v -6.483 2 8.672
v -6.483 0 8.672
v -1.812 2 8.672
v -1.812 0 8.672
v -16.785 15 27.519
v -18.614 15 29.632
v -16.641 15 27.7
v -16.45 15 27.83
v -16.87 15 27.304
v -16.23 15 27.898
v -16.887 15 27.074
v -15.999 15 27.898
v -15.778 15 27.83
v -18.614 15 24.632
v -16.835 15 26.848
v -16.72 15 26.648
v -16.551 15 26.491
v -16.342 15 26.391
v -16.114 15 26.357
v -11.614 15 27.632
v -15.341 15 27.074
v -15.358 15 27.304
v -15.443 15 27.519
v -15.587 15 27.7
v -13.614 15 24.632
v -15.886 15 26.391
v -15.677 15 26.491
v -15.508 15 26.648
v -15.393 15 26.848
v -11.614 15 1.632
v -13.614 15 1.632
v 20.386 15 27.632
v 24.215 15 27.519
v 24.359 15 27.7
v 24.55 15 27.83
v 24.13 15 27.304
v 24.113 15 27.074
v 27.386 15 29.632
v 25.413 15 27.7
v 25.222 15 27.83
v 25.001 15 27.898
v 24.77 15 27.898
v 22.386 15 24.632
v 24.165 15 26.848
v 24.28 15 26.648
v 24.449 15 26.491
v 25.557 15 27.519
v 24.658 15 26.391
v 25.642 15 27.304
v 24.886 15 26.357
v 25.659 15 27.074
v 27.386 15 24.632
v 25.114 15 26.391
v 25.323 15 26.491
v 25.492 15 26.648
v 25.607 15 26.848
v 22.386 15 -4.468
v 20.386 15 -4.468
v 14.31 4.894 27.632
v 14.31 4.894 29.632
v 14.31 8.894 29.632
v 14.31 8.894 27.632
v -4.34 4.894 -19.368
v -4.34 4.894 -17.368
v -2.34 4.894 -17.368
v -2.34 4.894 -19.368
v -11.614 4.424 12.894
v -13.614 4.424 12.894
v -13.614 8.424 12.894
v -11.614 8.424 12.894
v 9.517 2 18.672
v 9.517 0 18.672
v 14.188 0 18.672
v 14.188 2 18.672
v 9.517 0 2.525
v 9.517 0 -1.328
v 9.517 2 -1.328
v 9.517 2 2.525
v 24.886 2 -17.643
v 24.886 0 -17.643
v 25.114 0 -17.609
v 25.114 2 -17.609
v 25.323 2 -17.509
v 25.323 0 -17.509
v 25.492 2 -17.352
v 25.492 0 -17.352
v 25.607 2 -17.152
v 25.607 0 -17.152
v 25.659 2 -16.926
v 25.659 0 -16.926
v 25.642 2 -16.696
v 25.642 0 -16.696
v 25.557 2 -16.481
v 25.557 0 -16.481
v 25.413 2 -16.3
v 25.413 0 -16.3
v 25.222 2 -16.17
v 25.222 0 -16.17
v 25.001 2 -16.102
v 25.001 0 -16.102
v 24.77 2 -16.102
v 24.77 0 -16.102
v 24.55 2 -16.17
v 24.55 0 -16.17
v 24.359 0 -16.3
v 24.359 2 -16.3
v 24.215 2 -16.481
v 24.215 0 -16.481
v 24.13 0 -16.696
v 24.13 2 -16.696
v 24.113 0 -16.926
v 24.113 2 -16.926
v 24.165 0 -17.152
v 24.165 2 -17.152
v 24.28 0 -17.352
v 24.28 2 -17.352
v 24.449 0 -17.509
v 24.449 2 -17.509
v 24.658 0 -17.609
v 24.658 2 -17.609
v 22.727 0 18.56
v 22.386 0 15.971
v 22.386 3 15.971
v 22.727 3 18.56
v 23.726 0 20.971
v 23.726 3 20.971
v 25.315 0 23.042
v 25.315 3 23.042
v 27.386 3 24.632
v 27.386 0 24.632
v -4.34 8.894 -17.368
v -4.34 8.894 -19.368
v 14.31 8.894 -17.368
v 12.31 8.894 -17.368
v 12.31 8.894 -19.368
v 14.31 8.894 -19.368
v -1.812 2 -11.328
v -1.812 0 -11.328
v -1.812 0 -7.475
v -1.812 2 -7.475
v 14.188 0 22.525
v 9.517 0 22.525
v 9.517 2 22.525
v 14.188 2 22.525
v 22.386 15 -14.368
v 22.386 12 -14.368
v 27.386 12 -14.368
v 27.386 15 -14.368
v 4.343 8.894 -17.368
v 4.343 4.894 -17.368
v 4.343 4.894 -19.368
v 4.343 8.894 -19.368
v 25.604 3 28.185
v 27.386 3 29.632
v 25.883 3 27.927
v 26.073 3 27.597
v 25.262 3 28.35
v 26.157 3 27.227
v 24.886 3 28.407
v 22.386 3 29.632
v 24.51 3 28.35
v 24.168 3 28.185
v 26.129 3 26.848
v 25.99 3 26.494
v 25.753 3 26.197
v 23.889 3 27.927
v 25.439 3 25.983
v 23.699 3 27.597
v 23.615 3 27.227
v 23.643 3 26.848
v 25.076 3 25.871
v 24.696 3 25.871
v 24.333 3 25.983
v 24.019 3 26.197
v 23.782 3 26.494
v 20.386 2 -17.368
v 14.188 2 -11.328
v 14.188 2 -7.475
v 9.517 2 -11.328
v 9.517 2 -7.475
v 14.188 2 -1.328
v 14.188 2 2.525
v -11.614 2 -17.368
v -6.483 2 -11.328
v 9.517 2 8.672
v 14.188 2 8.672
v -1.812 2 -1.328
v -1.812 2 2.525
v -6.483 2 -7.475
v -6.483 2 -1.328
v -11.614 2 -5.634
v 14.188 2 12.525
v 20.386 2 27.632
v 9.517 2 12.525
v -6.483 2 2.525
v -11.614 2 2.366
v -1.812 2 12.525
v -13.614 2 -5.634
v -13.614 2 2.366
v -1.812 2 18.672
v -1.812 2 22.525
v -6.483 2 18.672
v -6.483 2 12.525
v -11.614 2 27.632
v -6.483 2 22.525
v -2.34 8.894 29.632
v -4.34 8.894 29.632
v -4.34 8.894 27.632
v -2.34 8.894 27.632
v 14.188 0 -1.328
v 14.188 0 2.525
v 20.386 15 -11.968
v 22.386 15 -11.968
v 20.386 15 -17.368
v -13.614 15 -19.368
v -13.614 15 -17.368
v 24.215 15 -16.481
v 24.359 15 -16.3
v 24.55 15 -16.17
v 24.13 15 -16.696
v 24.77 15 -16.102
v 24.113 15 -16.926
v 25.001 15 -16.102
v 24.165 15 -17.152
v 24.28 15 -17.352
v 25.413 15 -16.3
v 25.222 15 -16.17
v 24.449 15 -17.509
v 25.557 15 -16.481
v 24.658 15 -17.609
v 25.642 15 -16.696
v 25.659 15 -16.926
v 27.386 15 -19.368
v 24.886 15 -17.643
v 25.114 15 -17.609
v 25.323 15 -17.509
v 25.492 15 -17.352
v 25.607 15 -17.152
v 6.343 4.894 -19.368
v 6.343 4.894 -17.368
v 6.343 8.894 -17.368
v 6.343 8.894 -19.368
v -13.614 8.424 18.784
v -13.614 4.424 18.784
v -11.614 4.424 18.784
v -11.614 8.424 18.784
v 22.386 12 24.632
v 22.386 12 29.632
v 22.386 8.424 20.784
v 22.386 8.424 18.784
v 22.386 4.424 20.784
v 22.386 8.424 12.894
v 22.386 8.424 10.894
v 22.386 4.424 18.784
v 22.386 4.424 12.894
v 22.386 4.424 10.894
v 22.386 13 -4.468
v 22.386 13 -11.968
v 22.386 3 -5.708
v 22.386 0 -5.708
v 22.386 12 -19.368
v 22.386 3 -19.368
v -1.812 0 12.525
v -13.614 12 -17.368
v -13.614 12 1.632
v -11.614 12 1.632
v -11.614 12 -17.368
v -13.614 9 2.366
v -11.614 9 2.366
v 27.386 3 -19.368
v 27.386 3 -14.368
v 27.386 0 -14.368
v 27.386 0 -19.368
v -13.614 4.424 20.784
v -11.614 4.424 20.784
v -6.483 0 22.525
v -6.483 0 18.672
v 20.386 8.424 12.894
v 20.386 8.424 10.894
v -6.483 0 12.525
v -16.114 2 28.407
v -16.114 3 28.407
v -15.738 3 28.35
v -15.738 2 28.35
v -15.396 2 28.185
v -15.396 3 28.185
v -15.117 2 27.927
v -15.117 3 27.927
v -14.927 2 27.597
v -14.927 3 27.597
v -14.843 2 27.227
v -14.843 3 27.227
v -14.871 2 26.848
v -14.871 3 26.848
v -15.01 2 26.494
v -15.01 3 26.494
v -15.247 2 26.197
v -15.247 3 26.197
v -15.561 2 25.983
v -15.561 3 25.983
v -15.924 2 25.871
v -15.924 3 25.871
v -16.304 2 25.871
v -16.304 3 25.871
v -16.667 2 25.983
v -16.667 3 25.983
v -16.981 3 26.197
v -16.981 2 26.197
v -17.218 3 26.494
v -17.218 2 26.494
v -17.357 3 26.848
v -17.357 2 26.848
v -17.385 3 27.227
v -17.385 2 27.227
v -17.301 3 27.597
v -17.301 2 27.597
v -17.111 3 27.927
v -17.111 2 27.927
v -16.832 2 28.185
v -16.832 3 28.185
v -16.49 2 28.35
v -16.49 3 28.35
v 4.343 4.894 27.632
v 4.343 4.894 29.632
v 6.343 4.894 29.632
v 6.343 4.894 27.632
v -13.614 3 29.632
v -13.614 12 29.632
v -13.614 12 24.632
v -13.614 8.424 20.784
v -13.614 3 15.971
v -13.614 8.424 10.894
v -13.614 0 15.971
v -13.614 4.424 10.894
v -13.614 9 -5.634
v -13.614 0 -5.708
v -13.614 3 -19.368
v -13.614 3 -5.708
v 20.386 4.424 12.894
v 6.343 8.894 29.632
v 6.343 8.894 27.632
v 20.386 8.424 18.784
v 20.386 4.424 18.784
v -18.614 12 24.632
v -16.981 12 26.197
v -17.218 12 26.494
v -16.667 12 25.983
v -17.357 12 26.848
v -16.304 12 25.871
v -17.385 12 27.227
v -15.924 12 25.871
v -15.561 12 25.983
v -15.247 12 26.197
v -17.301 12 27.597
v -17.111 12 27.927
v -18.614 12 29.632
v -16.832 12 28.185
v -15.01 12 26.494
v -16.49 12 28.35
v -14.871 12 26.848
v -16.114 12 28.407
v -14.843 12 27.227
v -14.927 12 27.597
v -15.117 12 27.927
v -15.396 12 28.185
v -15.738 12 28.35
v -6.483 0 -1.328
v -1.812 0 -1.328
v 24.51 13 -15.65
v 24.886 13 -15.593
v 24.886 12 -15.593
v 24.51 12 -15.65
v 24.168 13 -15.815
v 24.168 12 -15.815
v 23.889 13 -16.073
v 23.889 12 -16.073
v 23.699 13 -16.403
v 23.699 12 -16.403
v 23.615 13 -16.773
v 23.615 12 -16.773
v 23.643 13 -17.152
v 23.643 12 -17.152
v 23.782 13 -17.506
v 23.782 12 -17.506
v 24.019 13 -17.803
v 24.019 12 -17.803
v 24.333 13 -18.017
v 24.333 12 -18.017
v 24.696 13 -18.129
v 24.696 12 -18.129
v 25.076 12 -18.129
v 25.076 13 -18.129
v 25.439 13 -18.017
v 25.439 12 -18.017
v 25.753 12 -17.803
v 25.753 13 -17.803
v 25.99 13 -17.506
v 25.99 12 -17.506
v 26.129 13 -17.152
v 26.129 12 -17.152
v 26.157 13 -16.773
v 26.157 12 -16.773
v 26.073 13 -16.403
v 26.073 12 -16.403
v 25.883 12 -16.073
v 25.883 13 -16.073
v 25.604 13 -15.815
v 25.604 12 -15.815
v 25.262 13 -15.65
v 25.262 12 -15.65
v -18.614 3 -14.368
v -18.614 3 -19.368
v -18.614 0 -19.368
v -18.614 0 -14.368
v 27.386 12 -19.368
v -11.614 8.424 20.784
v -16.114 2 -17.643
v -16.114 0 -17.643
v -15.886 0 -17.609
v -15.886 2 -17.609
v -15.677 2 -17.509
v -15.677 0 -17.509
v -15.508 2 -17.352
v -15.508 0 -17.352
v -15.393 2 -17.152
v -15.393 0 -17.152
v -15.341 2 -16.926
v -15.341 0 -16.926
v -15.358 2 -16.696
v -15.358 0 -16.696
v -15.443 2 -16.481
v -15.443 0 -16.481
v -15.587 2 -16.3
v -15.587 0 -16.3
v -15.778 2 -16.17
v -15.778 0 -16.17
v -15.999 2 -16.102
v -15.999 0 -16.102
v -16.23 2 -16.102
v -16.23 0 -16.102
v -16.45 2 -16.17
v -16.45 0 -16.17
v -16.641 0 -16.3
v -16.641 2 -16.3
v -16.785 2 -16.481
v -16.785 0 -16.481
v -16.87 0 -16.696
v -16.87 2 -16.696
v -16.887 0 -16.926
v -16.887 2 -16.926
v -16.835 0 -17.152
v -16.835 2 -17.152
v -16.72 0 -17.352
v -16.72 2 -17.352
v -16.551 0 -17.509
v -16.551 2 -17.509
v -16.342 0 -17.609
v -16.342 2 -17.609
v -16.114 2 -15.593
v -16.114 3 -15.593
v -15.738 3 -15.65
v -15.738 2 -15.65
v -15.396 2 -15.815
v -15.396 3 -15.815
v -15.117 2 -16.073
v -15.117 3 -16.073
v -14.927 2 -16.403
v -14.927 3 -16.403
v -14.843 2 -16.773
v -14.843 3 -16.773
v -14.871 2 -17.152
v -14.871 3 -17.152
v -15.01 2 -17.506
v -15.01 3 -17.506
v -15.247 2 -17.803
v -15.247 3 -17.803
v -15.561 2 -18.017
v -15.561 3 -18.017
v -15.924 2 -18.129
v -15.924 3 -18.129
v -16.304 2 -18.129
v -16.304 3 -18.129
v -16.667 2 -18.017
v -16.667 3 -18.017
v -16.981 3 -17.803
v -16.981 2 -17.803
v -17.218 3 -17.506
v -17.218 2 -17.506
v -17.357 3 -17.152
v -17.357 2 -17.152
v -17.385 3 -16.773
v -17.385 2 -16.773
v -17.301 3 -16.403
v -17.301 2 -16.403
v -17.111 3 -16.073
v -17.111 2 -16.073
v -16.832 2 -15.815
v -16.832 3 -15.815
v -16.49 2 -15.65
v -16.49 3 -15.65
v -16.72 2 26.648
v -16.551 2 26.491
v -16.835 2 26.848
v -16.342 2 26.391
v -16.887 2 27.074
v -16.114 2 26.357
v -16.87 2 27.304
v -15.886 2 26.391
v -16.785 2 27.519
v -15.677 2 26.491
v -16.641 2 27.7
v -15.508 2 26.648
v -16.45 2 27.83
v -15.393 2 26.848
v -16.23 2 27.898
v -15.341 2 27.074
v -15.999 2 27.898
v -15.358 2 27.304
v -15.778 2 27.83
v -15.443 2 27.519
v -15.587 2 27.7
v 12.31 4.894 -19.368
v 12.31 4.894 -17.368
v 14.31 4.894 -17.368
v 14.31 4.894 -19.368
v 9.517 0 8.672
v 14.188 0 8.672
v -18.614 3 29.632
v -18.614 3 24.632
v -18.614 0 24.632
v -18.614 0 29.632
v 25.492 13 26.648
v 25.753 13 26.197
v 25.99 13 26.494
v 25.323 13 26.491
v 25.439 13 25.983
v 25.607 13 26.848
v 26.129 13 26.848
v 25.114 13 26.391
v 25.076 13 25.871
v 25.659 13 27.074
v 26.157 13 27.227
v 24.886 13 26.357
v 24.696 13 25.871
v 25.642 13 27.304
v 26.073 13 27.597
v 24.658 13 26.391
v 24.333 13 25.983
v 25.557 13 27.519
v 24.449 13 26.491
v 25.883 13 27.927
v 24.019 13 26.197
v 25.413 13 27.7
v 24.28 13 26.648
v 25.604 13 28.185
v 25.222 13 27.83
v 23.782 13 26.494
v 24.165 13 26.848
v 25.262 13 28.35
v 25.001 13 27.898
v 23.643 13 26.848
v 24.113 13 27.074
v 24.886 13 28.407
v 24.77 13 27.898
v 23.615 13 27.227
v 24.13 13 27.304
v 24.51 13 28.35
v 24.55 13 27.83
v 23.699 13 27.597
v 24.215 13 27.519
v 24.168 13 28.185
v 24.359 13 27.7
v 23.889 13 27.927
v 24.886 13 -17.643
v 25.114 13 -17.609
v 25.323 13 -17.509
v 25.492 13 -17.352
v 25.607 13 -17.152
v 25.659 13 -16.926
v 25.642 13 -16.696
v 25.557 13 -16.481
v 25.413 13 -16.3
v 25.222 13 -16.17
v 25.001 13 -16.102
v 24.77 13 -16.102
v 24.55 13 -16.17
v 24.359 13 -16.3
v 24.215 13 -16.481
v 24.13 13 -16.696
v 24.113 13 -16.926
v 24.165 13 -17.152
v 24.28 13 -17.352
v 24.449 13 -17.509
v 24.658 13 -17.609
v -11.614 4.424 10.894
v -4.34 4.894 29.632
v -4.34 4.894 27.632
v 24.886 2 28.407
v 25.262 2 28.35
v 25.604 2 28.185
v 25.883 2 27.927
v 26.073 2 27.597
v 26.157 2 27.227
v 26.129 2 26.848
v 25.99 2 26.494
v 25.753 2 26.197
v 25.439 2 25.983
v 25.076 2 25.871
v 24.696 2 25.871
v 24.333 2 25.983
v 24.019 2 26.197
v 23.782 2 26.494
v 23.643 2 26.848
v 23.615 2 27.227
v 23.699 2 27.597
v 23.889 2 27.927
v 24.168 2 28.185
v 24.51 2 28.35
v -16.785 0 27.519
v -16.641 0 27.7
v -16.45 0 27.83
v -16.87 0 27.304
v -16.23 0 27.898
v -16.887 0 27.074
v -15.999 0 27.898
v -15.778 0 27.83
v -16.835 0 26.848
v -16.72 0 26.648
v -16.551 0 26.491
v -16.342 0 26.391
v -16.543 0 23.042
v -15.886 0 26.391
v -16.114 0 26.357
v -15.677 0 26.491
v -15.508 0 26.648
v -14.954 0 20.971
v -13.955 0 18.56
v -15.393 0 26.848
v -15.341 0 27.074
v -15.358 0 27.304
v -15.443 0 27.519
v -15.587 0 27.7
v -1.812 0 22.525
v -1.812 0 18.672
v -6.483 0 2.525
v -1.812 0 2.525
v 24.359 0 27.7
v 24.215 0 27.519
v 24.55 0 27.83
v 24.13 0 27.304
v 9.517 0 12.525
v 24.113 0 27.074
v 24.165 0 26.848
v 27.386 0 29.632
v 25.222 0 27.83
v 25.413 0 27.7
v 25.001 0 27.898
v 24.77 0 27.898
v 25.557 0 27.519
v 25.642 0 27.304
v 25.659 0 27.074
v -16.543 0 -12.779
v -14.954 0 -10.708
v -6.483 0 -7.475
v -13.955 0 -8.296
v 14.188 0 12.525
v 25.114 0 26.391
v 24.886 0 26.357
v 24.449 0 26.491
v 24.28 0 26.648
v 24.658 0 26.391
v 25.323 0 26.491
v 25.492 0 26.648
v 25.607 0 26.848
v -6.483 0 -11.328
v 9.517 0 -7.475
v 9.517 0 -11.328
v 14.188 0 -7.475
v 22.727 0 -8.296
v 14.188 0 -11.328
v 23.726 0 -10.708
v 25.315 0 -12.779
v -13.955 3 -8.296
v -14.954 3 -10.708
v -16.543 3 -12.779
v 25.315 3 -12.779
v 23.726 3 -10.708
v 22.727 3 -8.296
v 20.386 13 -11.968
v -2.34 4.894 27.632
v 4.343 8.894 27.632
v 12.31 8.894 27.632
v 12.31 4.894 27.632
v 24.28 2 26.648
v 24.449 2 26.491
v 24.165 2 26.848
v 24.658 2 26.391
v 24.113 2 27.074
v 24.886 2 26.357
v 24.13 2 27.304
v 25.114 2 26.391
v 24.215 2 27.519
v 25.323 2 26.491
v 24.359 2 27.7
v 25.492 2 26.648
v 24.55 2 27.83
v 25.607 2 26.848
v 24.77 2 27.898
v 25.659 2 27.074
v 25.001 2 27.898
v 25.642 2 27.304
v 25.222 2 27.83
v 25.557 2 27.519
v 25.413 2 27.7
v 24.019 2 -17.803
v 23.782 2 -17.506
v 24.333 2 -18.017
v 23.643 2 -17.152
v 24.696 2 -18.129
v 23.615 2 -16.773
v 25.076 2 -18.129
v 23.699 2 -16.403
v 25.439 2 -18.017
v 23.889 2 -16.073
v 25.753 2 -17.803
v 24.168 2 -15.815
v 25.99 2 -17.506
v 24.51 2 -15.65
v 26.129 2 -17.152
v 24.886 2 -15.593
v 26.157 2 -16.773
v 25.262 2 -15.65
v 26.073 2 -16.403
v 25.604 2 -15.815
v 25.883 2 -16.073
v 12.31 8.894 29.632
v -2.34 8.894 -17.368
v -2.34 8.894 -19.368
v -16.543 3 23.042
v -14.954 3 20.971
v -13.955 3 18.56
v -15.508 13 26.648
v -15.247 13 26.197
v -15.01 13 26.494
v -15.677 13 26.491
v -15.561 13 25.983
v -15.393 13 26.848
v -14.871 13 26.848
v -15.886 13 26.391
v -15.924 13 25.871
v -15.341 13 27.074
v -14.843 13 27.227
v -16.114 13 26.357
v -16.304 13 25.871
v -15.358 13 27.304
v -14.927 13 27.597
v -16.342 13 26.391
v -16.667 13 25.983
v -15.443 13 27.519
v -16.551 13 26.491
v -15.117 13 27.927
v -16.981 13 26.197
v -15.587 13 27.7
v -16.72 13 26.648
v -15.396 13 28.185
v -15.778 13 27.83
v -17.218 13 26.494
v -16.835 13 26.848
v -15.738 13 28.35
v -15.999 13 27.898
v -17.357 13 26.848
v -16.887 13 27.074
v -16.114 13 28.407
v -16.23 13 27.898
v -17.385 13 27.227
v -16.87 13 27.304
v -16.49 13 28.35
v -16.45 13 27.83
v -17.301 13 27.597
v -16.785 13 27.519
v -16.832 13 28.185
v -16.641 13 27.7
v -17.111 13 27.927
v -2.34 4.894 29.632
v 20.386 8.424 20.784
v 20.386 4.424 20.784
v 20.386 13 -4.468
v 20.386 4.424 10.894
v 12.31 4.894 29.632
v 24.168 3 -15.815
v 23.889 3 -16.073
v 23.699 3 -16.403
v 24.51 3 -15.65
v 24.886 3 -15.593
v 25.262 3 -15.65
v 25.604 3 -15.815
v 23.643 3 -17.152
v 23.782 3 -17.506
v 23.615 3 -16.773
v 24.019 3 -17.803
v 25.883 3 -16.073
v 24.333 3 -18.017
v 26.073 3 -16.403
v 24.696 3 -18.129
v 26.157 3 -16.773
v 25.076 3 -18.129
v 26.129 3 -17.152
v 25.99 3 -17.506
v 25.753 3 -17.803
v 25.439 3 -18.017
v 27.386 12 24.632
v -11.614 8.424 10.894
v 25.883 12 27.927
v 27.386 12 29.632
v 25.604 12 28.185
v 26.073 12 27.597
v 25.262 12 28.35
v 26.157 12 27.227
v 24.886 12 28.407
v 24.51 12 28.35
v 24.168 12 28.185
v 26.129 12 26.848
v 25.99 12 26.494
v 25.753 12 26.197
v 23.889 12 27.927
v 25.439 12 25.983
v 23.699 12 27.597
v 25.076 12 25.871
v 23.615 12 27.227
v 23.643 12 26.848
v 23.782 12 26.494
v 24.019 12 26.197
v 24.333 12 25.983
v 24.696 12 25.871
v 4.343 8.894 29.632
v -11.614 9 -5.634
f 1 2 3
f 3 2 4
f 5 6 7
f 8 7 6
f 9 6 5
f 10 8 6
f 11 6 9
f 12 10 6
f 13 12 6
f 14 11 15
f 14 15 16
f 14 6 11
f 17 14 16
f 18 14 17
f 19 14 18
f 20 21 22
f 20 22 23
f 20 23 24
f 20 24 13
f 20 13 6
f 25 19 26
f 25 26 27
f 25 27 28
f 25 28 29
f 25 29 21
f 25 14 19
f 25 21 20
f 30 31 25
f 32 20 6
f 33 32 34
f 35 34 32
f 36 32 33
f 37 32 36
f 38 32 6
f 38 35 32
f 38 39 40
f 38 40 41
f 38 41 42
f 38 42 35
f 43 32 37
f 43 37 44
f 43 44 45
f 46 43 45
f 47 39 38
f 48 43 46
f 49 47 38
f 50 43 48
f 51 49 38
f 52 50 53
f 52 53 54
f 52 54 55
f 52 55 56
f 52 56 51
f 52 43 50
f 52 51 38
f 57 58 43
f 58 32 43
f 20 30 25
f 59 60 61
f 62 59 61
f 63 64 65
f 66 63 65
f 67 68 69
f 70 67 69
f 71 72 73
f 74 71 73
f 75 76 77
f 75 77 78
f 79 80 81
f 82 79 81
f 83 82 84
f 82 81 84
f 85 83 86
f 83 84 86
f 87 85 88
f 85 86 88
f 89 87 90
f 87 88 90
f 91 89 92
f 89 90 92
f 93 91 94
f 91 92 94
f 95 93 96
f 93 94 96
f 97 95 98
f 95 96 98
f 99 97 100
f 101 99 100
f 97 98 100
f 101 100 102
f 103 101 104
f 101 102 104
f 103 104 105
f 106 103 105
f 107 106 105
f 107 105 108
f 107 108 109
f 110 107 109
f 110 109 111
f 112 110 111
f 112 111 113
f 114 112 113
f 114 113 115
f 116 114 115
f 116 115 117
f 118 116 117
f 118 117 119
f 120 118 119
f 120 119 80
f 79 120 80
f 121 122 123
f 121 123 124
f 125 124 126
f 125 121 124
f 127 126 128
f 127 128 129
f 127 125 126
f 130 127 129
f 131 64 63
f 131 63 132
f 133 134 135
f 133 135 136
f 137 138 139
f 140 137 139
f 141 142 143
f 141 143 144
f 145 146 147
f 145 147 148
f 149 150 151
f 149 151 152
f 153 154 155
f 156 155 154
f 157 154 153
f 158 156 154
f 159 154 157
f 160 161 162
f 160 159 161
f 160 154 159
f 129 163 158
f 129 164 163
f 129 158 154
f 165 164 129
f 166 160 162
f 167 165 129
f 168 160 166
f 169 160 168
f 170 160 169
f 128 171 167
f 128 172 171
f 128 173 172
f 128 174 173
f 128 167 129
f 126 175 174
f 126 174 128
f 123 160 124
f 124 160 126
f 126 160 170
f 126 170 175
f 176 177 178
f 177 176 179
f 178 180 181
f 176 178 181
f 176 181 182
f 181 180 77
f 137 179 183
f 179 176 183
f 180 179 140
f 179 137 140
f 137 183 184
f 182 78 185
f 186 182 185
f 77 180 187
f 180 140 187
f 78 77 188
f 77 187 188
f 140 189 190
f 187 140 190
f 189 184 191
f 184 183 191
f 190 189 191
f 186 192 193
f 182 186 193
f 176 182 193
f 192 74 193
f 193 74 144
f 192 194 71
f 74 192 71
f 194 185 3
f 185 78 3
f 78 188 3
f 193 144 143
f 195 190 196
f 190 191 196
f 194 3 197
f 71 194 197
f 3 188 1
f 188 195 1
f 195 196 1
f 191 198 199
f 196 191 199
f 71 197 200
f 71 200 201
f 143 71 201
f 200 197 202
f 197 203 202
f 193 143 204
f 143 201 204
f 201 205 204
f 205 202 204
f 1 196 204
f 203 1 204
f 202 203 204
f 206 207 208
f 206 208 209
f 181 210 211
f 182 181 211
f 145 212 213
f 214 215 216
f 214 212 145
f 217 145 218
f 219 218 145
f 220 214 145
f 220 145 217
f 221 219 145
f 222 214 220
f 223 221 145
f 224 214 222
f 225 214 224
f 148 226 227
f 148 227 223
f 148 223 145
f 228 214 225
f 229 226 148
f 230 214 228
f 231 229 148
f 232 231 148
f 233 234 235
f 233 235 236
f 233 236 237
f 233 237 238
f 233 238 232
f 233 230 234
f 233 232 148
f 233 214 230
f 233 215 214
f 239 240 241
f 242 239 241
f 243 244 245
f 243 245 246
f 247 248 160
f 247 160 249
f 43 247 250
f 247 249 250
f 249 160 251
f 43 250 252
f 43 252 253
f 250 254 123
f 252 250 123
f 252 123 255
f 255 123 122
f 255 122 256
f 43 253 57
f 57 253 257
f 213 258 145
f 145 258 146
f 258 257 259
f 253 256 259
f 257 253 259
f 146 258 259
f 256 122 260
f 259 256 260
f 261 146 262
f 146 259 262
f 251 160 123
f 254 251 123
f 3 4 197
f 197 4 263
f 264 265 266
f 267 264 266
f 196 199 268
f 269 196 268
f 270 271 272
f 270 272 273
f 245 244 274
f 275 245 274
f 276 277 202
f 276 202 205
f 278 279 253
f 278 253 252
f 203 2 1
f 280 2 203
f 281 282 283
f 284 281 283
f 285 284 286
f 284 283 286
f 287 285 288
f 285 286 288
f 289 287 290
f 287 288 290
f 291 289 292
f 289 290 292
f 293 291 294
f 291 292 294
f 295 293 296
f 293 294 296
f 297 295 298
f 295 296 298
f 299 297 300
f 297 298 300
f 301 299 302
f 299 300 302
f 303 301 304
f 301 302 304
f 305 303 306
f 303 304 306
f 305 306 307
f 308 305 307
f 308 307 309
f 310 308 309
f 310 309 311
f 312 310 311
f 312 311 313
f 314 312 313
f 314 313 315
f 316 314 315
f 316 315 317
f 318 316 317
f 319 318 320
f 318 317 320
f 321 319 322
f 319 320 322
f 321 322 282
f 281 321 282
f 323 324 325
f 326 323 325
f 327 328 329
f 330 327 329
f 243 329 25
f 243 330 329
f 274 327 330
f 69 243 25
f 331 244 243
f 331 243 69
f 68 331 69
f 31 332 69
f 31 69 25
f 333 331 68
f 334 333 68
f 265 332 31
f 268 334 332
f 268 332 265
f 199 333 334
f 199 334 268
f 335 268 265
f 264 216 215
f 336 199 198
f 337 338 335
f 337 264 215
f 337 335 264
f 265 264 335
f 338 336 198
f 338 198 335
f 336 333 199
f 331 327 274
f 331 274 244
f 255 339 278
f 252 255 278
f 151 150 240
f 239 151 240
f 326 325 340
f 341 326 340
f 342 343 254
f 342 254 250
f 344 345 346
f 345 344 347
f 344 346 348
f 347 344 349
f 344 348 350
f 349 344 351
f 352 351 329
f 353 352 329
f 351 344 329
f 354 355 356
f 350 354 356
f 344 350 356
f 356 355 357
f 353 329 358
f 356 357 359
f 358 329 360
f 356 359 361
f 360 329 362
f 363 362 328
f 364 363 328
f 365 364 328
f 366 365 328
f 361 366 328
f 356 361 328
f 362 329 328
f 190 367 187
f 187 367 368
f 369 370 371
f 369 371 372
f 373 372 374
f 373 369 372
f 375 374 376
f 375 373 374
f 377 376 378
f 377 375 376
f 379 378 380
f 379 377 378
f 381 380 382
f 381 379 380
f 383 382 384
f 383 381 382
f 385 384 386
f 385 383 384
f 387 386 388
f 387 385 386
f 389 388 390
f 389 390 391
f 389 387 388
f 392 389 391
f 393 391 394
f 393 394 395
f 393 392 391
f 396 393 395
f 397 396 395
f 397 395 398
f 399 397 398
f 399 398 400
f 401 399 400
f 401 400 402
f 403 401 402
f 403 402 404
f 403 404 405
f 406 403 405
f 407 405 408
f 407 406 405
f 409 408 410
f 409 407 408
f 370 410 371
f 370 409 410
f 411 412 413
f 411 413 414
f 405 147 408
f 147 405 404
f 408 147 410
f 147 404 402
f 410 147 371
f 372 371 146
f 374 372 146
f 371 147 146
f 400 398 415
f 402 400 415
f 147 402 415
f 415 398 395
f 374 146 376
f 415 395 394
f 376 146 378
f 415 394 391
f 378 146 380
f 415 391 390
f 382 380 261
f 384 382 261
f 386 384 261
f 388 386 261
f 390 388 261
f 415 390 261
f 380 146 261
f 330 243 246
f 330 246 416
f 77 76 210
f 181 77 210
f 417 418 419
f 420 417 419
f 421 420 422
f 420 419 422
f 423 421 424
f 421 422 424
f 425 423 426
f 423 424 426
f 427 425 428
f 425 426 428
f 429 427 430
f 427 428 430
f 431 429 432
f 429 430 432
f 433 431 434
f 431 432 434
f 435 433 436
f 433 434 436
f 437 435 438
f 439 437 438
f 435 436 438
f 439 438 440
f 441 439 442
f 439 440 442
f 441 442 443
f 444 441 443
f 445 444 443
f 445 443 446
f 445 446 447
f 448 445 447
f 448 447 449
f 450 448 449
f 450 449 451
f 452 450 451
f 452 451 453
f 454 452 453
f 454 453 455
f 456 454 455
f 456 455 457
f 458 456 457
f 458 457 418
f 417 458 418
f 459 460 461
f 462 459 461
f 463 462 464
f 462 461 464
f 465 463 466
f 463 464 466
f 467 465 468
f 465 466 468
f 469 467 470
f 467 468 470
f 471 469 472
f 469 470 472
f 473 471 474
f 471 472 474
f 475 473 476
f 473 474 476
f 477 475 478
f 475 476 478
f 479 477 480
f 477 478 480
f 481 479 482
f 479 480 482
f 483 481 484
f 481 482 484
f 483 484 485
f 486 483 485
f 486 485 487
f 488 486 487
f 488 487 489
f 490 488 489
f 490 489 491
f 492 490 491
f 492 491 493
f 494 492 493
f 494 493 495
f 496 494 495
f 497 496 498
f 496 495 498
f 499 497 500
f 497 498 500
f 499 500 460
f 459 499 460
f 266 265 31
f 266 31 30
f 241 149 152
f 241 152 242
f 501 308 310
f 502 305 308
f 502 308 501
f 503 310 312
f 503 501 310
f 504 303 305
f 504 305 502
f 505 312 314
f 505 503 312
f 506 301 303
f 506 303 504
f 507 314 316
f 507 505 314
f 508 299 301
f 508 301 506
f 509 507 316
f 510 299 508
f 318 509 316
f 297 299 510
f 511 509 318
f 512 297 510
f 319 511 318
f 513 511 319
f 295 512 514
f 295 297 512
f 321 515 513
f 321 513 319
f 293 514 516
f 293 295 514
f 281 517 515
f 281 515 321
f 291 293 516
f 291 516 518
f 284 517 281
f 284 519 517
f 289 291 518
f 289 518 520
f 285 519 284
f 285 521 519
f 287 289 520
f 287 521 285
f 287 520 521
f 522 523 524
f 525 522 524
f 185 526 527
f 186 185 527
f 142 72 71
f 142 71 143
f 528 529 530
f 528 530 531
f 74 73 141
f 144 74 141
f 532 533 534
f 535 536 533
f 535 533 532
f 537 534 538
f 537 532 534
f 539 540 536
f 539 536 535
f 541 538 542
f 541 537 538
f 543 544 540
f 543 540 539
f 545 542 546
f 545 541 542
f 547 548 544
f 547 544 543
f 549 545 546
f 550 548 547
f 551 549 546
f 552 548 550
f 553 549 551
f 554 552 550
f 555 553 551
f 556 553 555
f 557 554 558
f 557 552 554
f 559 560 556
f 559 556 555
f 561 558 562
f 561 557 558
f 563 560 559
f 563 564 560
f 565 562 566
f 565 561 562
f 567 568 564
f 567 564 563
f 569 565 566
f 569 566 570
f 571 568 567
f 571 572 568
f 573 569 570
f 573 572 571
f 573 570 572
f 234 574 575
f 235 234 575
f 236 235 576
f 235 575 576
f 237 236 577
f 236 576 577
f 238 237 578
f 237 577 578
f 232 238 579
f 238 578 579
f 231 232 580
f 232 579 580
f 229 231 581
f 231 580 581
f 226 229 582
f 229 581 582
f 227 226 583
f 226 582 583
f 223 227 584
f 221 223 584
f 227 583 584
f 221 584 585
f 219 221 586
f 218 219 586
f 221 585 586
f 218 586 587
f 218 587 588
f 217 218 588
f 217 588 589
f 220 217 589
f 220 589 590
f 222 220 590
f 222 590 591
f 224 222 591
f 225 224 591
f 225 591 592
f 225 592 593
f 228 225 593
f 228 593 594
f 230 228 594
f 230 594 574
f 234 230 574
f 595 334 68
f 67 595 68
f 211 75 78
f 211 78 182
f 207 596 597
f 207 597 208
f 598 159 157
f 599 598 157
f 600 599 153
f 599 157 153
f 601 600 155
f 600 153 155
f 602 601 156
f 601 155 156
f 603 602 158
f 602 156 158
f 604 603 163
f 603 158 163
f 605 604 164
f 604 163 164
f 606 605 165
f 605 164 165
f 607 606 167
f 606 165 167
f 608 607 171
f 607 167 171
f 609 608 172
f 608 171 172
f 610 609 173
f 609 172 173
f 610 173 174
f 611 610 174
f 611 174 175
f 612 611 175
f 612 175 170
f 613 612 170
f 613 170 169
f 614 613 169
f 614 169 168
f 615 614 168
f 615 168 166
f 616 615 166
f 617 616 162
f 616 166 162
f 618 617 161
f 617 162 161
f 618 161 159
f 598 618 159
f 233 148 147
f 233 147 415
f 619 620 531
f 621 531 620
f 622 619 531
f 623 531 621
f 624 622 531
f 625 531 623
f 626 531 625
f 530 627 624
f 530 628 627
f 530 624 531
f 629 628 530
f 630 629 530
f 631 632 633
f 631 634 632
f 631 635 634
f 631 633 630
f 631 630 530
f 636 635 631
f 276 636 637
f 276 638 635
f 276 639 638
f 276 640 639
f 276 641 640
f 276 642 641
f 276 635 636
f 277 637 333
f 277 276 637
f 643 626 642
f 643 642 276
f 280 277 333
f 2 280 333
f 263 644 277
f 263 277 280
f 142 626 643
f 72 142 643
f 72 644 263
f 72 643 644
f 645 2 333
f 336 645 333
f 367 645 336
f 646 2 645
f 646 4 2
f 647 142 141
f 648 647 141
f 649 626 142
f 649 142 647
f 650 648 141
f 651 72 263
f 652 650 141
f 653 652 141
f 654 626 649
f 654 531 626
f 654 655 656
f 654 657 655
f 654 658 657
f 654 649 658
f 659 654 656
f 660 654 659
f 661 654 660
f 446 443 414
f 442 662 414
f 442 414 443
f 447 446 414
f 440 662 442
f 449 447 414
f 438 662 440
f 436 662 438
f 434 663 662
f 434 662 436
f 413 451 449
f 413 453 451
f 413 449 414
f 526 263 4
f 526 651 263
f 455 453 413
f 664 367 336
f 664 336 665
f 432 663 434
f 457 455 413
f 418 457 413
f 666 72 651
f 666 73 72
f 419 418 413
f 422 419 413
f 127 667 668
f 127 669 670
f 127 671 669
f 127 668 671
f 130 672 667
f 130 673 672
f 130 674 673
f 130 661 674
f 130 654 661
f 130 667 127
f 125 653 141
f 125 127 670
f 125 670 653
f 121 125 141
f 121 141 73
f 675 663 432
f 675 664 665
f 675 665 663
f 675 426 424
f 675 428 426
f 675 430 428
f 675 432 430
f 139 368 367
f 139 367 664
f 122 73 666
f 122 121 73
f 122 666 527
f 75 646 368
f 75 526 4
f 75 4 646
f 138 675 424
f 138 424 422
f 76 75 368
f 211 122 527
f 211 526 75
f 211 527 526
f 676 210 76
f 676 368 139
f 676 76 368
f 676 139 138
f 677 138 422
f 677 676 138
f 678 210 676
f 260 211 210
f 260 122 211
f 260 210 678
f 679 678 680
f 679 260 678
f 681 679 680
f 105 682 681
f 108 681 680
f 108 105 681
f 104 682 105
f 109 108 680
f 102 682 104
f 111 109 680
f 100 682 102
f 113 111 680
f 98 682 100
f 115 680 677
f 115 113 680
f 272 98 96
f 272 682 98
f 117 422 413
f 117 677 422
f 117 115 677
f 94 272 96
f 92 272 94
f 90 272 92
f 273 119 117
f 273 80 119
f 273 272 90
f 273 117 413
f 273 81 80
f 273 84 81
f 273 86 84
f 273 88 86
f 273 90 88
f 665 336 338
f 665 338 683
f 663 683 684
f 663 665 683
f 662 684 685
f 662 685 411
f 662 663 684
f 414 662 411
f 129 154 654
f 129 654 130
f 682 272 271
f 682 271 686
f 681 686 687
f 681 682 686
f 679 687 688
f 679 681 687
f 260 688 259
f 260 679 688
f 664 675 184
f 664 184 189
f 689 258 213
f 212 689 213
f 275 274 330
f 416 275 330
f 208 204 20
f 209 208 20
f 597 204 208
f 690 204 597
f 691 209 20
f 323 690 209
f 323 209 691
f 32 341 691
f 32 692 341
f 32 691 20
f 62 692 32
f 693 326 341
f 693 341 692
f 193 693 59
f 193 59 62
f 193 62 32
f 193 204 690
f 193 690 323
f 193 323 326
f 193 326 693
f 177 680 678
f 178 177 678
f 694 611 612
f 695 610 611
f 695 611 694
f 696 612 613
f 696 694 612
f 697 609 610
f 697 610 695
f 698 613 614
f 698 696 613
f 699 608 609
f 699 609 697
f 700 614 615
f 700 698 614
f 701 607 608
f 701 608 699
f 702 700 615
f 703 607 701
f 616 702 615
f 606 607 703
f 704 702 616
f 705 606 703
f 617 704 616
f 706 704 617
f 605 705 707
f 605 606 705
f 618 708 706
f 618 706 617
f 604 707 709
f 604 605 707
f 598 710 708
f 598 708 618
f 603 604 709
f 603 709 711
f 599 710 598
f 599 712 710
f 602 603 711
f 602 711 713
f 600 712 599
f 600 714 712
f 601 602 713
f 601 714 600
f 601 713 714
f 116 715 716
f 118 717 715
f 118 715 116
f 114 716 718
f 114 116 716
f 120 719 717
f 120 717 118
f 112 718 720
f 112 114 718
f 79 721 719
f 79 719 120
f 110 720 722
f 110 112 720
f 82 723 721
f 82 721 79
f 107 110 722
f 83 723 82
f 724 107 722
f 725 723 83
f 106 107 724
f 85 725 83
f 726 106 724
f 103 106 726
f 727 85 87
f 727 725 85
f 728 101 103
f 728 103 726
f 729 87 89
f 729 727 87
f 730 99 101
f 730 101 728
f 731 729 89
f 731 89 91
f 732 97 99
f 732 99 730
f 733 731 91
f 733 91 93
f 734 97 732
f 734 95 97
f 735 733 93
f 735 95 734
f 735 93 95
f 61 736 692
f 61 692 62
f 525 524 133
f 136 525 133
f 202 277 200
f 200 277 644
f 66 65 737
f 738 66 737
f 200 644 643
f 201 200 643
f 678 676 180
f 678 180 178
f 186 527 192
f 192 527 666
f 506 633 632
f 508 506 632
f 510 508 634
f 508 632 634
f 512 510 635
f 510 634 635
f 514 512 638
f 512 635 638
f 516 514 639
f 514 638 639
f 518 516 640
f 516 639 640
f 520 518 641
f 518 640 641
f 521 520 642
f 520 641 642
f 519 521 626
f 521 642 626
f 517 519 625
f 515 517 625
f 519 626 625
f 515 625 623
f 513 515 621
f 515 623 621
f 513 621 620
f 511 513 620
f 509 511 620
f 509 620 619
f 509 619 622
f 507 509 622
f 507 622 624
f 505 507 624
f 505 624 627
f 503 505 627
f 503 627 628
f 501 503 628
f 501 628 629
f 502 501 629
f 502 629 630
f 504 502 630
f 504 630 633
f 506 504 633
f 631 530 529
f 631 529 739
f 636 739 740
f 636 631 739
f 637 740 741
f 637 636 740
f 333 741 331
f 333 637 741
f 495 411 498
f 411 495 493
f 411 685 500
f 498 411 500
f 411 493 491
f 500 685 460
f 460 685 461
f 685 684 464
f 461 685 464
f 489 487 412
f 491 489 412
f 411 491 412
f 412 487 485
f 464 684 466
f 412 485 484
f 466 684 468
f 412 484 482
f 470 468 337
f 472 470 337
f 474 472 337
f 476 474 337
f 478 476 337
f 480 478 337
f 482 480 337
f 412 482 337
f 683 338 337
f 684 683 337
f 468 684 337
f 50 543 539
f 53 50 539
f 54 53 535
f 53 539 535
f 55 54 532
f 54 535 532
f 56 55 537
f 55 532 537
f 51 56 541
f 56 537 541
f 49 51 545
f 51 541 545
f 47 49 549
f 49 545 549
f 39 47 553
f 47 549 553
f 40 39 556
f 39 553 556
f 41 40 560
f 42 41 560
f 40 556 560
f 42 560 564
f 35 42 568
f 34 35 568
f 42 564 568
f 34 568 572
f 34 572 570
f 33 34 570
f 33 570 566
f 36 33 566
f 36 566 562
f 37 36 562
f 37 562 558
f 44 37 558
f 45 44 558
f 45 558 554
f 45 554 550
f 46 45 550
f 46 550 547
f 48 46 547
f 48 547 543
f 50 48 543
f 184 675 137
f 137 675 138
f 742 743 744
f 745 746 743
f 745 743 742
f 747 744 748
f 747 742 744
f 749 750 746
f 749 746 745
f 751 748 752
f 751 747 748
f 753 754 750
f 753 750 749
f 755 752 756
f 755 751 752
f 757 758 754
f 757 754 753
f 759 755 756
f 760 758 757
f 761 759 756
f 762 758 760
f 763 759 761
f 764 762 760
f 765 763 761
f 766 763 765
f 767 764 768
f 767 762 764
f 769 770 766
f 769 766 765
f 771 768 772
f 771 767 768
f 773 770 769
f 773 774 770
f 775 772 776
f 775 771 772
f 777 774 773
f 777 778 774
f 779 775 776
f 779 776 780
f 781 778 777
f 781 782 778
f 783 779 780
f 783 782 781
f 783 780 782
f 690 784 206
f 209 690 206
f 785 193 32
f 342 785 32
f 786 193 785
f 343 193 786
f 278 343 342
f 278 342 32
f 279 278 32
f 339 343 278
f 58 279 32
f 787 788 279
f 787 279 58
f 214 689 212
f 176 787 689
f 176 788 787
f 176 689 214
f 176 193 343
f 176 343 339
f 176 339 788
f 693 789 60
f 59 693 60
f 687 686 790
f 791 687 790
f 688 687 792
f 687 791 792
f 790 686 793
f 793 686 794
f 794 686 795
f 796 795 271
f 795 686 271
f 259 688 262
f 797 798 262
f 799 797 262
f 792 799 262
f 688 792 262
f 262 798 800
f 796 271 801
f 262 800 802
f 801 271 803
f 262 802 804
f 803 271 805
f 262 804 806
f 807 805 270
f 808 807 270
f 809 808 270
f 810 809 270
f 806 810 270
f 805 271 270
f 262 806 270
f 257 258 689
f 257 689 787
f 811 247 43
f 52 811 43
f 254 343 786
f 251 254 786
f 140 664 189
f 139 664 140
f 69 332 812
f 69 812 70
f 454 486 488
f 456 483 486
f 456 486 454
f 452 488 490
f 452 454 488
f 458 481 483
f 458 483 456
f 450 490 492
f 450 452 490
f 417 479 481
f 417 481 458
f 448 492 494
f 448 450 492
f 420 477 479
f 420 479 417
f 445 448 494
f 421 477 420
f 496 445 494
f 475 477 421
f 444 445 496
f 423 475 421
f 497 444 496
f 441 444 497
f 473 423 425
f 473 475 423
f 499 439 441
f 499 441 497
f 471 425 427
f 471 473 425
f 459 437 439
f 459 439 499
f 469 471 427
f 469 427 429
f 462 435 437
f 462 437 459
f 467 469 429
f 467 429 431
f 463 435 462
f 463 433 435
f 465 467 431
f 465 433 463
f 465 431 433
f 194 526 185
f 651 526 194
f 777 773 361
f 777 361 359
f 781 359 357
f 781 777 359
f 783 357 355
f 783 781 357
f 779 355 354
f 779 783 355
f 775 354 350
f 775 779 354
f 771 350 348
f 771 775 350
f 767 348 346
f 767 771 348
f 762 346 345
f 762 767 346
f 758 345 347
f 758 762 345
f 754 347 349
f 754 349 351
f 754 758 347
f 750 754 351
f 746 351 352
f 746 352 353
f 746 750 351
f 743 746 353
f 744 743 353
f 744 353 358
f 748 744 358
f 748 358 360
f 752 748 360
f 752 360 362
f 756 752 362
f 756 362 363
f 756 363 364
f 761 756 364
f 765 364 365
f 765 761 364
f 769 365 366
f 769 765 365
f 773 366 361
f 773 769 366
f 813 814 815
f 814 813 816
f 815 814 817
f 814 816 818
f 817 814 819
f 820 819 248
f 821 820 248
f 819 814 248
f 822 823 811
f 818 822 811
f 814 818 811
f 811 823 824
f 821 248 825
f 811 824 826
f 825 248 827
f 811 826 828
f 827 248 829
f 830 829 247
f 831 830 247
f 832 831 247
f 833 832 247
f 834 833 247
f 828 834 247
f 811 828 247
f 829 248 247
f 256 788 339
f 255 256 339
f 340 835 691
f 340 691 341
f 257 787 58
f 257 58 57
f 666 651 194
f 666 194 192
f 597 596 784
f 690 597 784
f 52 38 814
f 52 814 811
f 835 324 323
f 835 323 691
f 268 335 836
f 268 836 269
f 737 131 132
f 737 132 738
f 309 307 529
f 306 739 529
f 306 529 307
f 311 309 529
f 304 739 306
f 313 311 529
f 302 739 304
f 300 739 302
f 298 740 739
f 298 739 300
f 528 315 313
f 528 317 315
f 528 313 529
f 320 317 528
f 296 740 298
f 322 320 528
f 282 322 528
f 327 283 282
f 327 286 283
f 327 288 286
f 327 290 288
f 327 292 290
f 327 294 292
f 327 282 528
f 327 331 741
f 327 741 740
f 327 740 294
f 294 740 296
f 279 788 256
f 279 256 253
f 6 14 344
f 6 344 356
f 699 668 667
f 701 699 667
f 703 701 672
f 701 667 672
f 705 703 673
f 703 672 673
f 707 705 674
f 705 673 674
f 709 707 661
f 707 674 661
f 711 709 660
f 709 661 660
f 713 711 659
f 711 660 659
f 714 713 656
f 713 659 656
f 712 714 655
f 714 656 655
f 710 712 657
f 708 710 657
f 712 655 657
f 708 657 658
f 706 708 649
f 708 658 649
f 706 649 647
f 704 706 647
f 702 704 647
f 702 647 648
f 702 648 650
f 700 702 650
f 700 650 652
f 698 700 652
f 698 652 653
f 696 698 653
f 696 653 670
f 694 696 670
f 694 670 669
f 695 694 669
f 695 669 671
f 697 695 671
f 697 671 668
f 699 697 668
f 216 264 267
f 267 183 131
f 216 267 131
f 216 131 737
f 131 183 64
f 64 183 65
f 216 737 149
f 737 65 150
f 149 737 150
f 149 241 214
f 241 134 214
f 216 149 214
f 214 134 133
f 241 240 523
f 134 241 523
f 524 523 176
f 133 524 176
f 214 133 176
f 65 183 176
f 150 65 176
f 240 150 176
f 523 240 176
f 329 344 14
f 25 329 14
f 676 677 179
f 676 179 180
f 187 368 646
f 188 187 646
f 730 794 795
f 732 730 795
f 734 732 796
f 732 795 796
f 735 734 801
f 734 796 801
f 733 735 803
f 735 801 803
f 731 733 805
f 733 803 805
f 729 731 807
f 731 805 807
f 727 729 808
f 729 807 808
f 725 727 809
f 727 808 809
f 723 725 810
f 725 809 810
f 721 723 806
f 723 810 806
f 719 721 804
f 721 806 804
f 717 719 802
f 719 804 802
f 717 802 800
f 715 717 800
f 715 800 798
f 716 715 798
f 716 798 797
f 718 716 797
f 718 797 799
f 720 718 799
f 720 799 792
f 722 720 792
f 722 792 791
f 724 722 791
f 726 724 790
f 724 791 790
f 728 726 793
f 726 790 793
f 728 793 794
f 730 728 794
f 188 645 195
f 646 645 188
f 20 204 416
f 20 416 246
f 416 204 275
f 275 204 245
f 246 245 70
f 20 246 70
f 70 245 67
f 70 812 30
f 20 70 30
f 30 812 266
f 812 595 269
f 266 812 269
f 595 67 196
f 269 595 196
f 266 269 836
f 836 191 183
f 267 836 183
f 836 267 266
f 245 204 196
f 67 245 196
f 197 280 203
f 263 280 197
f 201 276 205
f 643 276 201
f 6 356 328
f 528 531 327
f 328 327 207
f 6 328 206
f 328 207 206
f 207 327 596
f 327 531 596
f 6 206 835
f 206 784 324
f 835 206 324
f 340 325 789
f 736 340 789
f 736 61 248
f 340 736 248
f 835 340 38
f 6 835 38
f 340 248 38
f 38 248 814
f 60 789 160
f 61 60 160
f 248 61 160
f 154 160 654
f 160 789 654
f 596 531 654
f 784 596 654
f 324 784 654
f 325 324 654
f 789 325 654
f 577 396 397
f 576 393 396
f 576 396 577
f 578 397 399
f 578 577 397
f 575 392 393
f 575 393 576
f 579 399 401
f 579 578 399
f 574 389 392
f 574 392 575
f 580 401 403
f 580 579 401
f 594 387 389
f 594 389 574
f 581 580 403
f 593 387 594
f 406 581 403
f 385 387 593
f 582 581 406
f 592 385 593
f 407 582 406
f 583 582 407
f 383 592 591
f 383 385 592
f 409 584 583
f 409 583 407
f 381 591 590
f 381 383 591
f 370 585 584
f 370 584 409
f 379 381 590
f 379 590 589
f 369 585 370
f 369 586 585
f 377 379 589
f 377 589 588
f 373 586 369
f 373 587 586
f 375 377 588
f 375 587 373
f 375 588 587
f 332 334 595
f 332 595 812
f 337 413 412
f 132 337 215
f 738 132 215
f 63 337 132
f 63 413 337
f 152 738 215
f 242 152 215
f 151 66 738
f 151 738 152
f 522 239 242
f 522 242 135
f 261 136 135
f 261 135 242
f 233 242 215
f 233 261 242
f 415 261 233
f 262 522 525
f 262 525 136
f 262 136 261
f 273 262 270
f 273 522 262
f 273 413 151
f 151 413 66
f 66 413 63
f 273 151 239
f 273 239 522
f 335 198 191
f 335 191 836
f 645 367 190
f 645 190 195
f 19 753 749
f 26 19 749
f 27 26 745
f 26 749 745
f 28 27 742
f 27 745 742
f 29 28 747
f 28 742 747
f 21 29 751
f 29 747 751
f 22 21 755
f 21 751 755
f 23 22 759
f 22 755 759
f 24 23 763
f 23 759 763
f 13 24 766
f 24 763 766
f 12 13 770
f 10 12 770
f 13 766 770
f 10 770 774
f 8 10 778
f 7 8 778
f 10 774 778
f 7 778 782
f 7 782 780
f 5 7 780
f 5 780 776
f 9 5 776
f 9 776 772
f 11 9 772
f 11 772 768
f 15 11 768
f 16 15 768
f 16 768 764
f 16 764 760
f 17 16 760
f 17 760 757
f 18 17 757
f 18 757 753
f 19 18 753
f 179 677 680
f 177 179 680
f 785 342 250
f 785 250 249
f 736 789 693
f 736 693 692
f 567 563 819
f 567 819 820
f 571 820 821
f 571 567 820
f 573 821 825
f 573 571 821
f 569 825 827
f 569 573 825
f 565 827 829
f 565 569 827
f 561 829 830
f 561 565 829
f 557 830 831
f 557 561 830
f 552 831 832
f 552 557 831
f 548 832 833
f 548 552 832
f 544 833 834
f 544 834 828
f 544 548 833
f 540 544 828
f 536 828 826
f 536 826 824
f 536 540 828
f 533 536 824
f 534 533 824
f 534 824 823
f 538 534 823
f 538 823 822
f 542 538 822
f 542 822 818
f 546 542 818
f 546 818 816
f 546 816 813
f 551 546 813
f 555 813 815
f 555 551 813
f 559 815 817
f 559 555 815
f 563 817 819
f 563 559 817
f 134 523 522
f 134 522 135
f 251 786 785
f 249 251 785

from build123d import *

# Parameters (mm, degrees)
SKETCH1_W               = 36
SKETCH1_H               = 49
BOSS_EXTRUDE1_DEPTH     = 2
SKETCH2_W               = 36
SKETCH2_H               = 49
SKETCH2_W_2             = 32
SKETCH2_H_2             = 45
BOSS_EXTRUDE2_DEPTH     = 13
CUT_EXTRUDE1_DEPTH      = 5
CUT_EXTRUDE1_DEPTH_BACK = 48.529259103
SKETCH3_W               = 7.5
SKETCH3_H               = 2
SKETCH4_W               = 4.670437484
SKETCH4_H               = 3.853110924
CUT_EXTRUDE2_DEPTH      = 41.051989913
SKETCH10_W              = 2
SKETCH10_H              = 19
CUT_EXTRUDE6_DEPTH      = 3
SKETCH11_W              = 8
SKETCH11_H              = 7
CUT_EXTRUDE7_DEPTH      = 2
SKETCH12_W              = 5
SKETCH12_H              = 3
BOSS_EXTRUDE3_DEPTH     = 5
SKETCH13_W              = 5
SKETCH13_H              = 3
BOSS_EXTRUDE4_DEPTH     = 5
SKETCH14_R              = 0.775
CUT_EXTRUDE8_DEPTH      = 44.046736753
SKETCH15_R              = 1.275
CUT_EXTRUDE9_DEPTH      = 1
CUT_EXTRUDE10_START     = -1
SKETCH16_R              = 1.275
CUT_EXTRUDE10_DEPTH     = 1
FILLET2_R               = 10
SKETCH17_W              = 2
SKETCH17_H              = 4
CUT_EXTRUDE11_DEPTH     = 59.103279375
SKETCH18_W              = 2
SKETCH18_H              = 4
CUT_EXTRUDE12_DEPTH     = 53.763912582
SKETCH19_W              = 37.08283529
SKETCH19_H              = 2
CUT_EXTRUDE13_DEPTH     = 2
SKETCH20_W              = 37.08283529
SKETCH20_H              = 2
BOSS_EXTRUDE5_DEPTH     = 2
SKETCH21_W              = 2
SKETCH21_H              = 28
CUT_EXTRUDE14_DEPTH     = 2
SKETCH22_W              = 2
SKETCH22_H              = 28
BOSS_EXTRUDE6_DEPTH     = 2
SKETCH23_W              = 2
SKETCH23_H              = 34.1
CUT_EXTRUDE16_DEPTH     = 1.5
SKETCH24_W              = 2
SKETCH24_H              = 34.1
BOSS_EXTRUDE7_DEPTH     = 1.5


with BuildPart() as part:
    # Sketch1 → Boss-Extrude1 (new body)
    with BuildSketch(Plane(origin=(0, 0, 0), x_dir=(1, 0, 0), z_dir=(0, 1, 0))):
        with Locations((4.385964912, -5.131578947)):
            Rectangle(SKETCH1_W, SKETCH1_H)
    extrude(amount=BOSS_EXTRUDE1_DEPTH)

    # Sketch2 → Boss-Extrude2 (add)
    with BuildSketch(Plane(origin=(0, 2, 0), x_dir=(1, 0, 0), z_dir=(0, 1, 0))):
        with Locations((4.385964912, -5.131578947)):
            Rectangle(SKETCH2_W, SKETCH2_H)
        with Locations((4.385964912, -5.131578947)):
            Rectangle(SKETCH2_W_2, SKETCH2_H_2, mode=Mode.SUBTRACT)
    extrude(amount=BOSS_EXTRUDE2_DEPTH)

    # Sketch3 → Cut-Extrude1 (cut, two sides: drawn at the far end of the back side and taken through both)
    with BuildSketch(Plane.ZY.offset(-20.385964912).offset(-CUT_EXTRUDE1_DEPTH_BACK)):
        with Locations((-8.218421053, 14)):
            Rectangle(SKETCH3_W, SKETCH3_H)
    extrude(amount=CUT_EXTRUDE1_DEPTH + CUT_EXTRUDE1_DEPTH_BACK, mode=Mode.SUBTRACT)

    # Sketch4 → Cut-Extrude2 (cut, through all)
    with BuildSketch(Plane.XZ):
        with Locations((11.852478182, 20.598290589)):
            Rectangle(SKETCH4_W, SKETCH4_H)
        with Locations((-4.147521818, 20.598290589)):
            Rectangle(SKETCH4_W, SKETCH4_H)
        with Locations((11.852478182, 10.598290589)):
            Rectangle(SKETCH4_W, SKETCH4_H)
        with Locations((11.852478182, 0.598290589)):
            Rectangle(SKETCH4_W, SKETCH4_H)
        with Locations((11.852478182, -9.401709411)):
            Rectangle(SKETCH4_W, SKETCH4_H)
        with Locations((-4.147521818, 10.598290589)):
            Rectangle(SKETCH4_W, SKETCH4_H)
        with Locations((-4.147521818, 0.598290589)):
            Rectangle(SKETCH4_W, SKETCH4_H)
        with Locations((-4.147521818, -9.401709411)):
            Rectangle(SKETCH4_W, SKETCH4_H)
    extrude(amount=-CUT_EXTRUDE2_DEPTH, mode=Mode.SUBTRACT)

    # Sketch10 → Cut-Extrude6 (cut)
    with BuildSketch(Plane(origin=(0, 15, 0), x_dir=(1, 0, 0), z_dir=(0, 1, 0))):
        with Locations((-12.614035088, 7.868421053)):
            Rectangle(SKETCH10_W, SKETCH10_H)
    extrude(amount=-CUT_EXTRUDE6_DEPTH, mode=Mode.SUBTRACT)

    # Sketch11 → Cut-Extrude7 (cut)
    with BuildSketch(Plane.ZY.offset(13.614035088)):
        with Locations((-1.634350226, 5.5)):
            Rectangle(SKETCH11_W, SKETCH11_H)
    extrude(amount=-CUT_EXTRUDE7_DEPTH, mode=Mode.SUBTRACT)

    # Sketch12 → Boss-Extrude3 (add)
    with BuildSketch(Plane.ZY.offset(13.614035088)):
        with Locations((-16.868421053, 1.5)):
            Rectangle(SKETCH12_W, SKETCH12_H)
        with Locations((27.131578947, 13.5)):
            Rectangle(SKETCH12_W, SKETCH12_H)
        with Locations((27.131578947, 1.5)):
            Rectangle(SKETCH12_W, SKETCH12_H)
    extrude(amount=BOSS_EXTRUDE3_DEPTH)

    # Sketch13 → Boss-Extrude4 (add)
    with BuildSketch(Plane(origin=(22.385964912, 0, 0), x_dir=(0, 0, -1), z_dir=(1, 0, 0))):
        with Locations((16.868421053, 1.5)):
            Rectangle(SKETCH13_W, SKETCH13_H)
        with Locations((-27.131578947, 13.5)):
            Rectangle(SKETCH13_W, SKETCH13_H)
        with Locations((-27.131578947, 1.5)):
            Rectangle(SKETCH13_W, SKETCH13_H)
        with Locations((16.868421053, 13.5)):
            Rectangle(SKETCH13_W, SKETCH13_H)
    extrude(amount=BOSS_EXTRUDE4_DEPTH)

    # Sketch14 → Cut-Extrude8 (cut, through all)
    with BuildSketch(Plane.XZ):
        with Locations(Location((24.885964912, -16.868421053, 0), (0, 0, 270))):
            Circle(SKETCH14_R)
        with Locations(Location((-16.114035088, -16.868421053, 0), (0, 0, 270))):
            Circle(SKETCH14_R)
        with Locations(Location((-16.114035088, 27.131578947, 0), (0, 0, 270))):
            Circle(SKETCH14_R)
        with Locations(Location((24.885964912, 27.131578947, 0), (0, 0, 270))):
            Circle(SKETCH14_R)
    extrude(amount=-CUT_EXTRUDE8_DEPTH, mode=Mode.SUBTRACT)

    # Sketch15 → Cut-Extrude9 (cut)
    with BuildSketch(Plane(origin=(0, 3, 0), x_dir=(1, 0, 0), z_dir=(0, 1, 0))):
        with Locations(Location((24.885964912, 16.868421053, 0), (0, 0, 270))):
            Circle(SKETCH15_R)
        with Locations(Location((24.885964912, -27.131578947, 0), (0, 0, 270))):
            Circle(SKETCH15_R)
        with Locations(Location((-16.114035088, -27.131578947, 0), (0, 0, 270))):
            Circle(SKETCH15_R)
        with Locations(Location((-16.114035088, 16.868421053, 0), (0, 0, 270))):
            Circle(SKETCH15_R)
    extrude(amount=-CUT_EXTRUDE9_DEPTH, mode=Mode.SUBTRACT)

    # Sketch16 → Cut-Extrude10 (cut)
    with BuildSketch(Plane.XZ.offset(-12).offset(CUT_EXTRUDE10_START)):
        with Locations(Location((-16.114035088, 27.131578947, 0), (0, 0, 90))):
            Circle(SKETCH16_R)
        with Locations(Location((24.885964912, 27.131578947, 0), (0, 0, 90))):
            Circle(SKETCH16_R)
        with Locations(Location((24.885964912, -16.868421053, 0), (0, 0, 90))):
            Circle(SKETCH16_R)
    extrude(amount=CUT_EXTRUDE10_DEPTH, mode=Mode.SUBTRACT)

    # Fillet2
    # the kernel refuses this fillet: 10 mm, written as the material it adds along each edge
    with BuildSketch(Plane(origin=(-13.614035088, 0, -14.368421053), x_dir=(0, 0, 1), z_dir=(0, 1, 0)), Plane(origin=(22.385964912, 0, 24.631578947), x_dir=(0, 0, -1), z_dir=(0, 1, 0))) as fillet2_piece_1:
        with BuildLine():
            CenterArc((8.660254038, -10), FILLET2_R, 90, 60)
            Line((0, -5), (0, 0))
            Line((0, 0), (8.660254038, 0))
        make_face()
    extrude(amount=3)
    with BuildSketch(Plane(origin=(22.385964912, 0, -14.368421053), x_dir=(0, 0, 1), z_dir=(0, 1, 0)), Plane(origin=(-13.614035088, 0, 24.631578947), x_dir=(0, 0, -1), z_dir=(0, 1, 0))) as fillet2_piece_2:
        with BuildLine():
            CenterArc((8.660254038, 10), FILLET2_R, 210, 60)
            Line((0, 5), (0, 0))
            Line((0, 0), (8.660254038, 0))
        make_face()
    extrude(amount=3)

    # Sketch17 → Cut-Extrude11 (cut, through all)
    with BuildSketch(Plane.XY.offset(29.631578947)):
        with Locations((-3.340209091, 6.894489406)):
            Rectangle(SKETCH17_W, SKETCH17_H)
        with Locations((5.343190897, 6.894489406)):
            Rectangle(SKETCH17_W, SKETCH17_H)
        with Locations((13.309543319, 6.894489406)):
            Rectangle(SKETCH17_W, SKETCH17_H)
    extrude(amount=-CUT_EXTRUDE11_DEPTH, mode=Mode.SUBTRACT)

    # Sketch18 → Cut-Extrude12 (cut, through all)
    with BuildSketch(Plane.ZY.offset(13.614035088)):
        with Locations((11.893757697, 6.4242408)):
            Rectangle(SKETCH18_W, SKETCH18_H)
        with Locations((19.784308777, 6.4242408)):
            Rectangle(SKETCH18_W, SKETCH18_H)
    extrude(amount=-CUT_EXTRUDE12_DEPTH, mode=Mode.SUBTRACT)

    # Sketch19 → Cut-Extrude13 (cut)
    with BuildSketch(Plane(origin=(0, 15, 0), x_dir=(1, 0, 0), z_dir=(0, 1, 0))):
        with Locations((4.927382557, 18.368421053)):
            Rectangle(SKETCH19_W, SKETCH19_H)
    extrude(amount=-CUT_EXTRUDE13_DEPTH, mode=Mode.SUBTRACT)

    # Sketch20 → Boss-Extrude5 (add)
    with BuildSketch(Plane(origin=(0, 13, 0), x_dir=(1, 0, 0), z_dir=(0, 1, 0))):
        with Locations((4.927382557, 18.368421053)):
            Rectangle(SKETCH20_W, SKETCH20_H)
    extrude(amount=BOSS_EXTRUDE5_DEPTH)

    # Sketch21 → Cut-Extrude14 (cut)
    with BuildSketch(Plane(origin=(0, 15, 0), x_dir=(1, 0, 0), z_dir=(0, 1, 0))):
        with Locations((-12.614035088, -15.631578947)):
            Rectangle(SKETCH21_W, SKETCH21_H)
    extrude(amount=-CUT_EXTRUDE14_DEPTH, mode=Mode.SUBTRACT)

    # Sketch22 → Boss-Extrude6 (add)
    with BuildSketch(Plane(origin=(0, 13, 0), x_dir=(1, 0, 0), z_dir=(0, 1, 0))):
        with Locations((-12.614035088, -15.631578947)):
            Rectangle(SKETCH22_W, SKETCH22_H)
    extrude(amount=BOSS_EXTRUDE6_DEPTH)

    # Sketch23 → Cut-Extrude16 (cut)
    with BuildSketch(Plane(origin=(0, 15, 0), x_dir=(1, 0, 0), z_dir=(0, 1, 0))):
        with Locations((21.385964912, -12.581578947)):
            Rectangle(SKETCH23_W, SKETCH23_H)
    extrude(amount=-CUT_EXTRUDE16_DEPTH, mode=Mode.SUBTRACT)

    # Sketch24 → Boss-Extrude7 (add)
    with BuildSketch(Plane(origin=(0, 13.5, 0), x_dir=(1, 0, 0), z_dir=(0, 1, 0))):
        with Locations((21.385964912, -12.581578947)):
            Rectangle(SKETCH24_W, SKETCH24_H)
    extrude(amount=BOSS_EXTRUDE7_DEPTH)


solid = part.part
